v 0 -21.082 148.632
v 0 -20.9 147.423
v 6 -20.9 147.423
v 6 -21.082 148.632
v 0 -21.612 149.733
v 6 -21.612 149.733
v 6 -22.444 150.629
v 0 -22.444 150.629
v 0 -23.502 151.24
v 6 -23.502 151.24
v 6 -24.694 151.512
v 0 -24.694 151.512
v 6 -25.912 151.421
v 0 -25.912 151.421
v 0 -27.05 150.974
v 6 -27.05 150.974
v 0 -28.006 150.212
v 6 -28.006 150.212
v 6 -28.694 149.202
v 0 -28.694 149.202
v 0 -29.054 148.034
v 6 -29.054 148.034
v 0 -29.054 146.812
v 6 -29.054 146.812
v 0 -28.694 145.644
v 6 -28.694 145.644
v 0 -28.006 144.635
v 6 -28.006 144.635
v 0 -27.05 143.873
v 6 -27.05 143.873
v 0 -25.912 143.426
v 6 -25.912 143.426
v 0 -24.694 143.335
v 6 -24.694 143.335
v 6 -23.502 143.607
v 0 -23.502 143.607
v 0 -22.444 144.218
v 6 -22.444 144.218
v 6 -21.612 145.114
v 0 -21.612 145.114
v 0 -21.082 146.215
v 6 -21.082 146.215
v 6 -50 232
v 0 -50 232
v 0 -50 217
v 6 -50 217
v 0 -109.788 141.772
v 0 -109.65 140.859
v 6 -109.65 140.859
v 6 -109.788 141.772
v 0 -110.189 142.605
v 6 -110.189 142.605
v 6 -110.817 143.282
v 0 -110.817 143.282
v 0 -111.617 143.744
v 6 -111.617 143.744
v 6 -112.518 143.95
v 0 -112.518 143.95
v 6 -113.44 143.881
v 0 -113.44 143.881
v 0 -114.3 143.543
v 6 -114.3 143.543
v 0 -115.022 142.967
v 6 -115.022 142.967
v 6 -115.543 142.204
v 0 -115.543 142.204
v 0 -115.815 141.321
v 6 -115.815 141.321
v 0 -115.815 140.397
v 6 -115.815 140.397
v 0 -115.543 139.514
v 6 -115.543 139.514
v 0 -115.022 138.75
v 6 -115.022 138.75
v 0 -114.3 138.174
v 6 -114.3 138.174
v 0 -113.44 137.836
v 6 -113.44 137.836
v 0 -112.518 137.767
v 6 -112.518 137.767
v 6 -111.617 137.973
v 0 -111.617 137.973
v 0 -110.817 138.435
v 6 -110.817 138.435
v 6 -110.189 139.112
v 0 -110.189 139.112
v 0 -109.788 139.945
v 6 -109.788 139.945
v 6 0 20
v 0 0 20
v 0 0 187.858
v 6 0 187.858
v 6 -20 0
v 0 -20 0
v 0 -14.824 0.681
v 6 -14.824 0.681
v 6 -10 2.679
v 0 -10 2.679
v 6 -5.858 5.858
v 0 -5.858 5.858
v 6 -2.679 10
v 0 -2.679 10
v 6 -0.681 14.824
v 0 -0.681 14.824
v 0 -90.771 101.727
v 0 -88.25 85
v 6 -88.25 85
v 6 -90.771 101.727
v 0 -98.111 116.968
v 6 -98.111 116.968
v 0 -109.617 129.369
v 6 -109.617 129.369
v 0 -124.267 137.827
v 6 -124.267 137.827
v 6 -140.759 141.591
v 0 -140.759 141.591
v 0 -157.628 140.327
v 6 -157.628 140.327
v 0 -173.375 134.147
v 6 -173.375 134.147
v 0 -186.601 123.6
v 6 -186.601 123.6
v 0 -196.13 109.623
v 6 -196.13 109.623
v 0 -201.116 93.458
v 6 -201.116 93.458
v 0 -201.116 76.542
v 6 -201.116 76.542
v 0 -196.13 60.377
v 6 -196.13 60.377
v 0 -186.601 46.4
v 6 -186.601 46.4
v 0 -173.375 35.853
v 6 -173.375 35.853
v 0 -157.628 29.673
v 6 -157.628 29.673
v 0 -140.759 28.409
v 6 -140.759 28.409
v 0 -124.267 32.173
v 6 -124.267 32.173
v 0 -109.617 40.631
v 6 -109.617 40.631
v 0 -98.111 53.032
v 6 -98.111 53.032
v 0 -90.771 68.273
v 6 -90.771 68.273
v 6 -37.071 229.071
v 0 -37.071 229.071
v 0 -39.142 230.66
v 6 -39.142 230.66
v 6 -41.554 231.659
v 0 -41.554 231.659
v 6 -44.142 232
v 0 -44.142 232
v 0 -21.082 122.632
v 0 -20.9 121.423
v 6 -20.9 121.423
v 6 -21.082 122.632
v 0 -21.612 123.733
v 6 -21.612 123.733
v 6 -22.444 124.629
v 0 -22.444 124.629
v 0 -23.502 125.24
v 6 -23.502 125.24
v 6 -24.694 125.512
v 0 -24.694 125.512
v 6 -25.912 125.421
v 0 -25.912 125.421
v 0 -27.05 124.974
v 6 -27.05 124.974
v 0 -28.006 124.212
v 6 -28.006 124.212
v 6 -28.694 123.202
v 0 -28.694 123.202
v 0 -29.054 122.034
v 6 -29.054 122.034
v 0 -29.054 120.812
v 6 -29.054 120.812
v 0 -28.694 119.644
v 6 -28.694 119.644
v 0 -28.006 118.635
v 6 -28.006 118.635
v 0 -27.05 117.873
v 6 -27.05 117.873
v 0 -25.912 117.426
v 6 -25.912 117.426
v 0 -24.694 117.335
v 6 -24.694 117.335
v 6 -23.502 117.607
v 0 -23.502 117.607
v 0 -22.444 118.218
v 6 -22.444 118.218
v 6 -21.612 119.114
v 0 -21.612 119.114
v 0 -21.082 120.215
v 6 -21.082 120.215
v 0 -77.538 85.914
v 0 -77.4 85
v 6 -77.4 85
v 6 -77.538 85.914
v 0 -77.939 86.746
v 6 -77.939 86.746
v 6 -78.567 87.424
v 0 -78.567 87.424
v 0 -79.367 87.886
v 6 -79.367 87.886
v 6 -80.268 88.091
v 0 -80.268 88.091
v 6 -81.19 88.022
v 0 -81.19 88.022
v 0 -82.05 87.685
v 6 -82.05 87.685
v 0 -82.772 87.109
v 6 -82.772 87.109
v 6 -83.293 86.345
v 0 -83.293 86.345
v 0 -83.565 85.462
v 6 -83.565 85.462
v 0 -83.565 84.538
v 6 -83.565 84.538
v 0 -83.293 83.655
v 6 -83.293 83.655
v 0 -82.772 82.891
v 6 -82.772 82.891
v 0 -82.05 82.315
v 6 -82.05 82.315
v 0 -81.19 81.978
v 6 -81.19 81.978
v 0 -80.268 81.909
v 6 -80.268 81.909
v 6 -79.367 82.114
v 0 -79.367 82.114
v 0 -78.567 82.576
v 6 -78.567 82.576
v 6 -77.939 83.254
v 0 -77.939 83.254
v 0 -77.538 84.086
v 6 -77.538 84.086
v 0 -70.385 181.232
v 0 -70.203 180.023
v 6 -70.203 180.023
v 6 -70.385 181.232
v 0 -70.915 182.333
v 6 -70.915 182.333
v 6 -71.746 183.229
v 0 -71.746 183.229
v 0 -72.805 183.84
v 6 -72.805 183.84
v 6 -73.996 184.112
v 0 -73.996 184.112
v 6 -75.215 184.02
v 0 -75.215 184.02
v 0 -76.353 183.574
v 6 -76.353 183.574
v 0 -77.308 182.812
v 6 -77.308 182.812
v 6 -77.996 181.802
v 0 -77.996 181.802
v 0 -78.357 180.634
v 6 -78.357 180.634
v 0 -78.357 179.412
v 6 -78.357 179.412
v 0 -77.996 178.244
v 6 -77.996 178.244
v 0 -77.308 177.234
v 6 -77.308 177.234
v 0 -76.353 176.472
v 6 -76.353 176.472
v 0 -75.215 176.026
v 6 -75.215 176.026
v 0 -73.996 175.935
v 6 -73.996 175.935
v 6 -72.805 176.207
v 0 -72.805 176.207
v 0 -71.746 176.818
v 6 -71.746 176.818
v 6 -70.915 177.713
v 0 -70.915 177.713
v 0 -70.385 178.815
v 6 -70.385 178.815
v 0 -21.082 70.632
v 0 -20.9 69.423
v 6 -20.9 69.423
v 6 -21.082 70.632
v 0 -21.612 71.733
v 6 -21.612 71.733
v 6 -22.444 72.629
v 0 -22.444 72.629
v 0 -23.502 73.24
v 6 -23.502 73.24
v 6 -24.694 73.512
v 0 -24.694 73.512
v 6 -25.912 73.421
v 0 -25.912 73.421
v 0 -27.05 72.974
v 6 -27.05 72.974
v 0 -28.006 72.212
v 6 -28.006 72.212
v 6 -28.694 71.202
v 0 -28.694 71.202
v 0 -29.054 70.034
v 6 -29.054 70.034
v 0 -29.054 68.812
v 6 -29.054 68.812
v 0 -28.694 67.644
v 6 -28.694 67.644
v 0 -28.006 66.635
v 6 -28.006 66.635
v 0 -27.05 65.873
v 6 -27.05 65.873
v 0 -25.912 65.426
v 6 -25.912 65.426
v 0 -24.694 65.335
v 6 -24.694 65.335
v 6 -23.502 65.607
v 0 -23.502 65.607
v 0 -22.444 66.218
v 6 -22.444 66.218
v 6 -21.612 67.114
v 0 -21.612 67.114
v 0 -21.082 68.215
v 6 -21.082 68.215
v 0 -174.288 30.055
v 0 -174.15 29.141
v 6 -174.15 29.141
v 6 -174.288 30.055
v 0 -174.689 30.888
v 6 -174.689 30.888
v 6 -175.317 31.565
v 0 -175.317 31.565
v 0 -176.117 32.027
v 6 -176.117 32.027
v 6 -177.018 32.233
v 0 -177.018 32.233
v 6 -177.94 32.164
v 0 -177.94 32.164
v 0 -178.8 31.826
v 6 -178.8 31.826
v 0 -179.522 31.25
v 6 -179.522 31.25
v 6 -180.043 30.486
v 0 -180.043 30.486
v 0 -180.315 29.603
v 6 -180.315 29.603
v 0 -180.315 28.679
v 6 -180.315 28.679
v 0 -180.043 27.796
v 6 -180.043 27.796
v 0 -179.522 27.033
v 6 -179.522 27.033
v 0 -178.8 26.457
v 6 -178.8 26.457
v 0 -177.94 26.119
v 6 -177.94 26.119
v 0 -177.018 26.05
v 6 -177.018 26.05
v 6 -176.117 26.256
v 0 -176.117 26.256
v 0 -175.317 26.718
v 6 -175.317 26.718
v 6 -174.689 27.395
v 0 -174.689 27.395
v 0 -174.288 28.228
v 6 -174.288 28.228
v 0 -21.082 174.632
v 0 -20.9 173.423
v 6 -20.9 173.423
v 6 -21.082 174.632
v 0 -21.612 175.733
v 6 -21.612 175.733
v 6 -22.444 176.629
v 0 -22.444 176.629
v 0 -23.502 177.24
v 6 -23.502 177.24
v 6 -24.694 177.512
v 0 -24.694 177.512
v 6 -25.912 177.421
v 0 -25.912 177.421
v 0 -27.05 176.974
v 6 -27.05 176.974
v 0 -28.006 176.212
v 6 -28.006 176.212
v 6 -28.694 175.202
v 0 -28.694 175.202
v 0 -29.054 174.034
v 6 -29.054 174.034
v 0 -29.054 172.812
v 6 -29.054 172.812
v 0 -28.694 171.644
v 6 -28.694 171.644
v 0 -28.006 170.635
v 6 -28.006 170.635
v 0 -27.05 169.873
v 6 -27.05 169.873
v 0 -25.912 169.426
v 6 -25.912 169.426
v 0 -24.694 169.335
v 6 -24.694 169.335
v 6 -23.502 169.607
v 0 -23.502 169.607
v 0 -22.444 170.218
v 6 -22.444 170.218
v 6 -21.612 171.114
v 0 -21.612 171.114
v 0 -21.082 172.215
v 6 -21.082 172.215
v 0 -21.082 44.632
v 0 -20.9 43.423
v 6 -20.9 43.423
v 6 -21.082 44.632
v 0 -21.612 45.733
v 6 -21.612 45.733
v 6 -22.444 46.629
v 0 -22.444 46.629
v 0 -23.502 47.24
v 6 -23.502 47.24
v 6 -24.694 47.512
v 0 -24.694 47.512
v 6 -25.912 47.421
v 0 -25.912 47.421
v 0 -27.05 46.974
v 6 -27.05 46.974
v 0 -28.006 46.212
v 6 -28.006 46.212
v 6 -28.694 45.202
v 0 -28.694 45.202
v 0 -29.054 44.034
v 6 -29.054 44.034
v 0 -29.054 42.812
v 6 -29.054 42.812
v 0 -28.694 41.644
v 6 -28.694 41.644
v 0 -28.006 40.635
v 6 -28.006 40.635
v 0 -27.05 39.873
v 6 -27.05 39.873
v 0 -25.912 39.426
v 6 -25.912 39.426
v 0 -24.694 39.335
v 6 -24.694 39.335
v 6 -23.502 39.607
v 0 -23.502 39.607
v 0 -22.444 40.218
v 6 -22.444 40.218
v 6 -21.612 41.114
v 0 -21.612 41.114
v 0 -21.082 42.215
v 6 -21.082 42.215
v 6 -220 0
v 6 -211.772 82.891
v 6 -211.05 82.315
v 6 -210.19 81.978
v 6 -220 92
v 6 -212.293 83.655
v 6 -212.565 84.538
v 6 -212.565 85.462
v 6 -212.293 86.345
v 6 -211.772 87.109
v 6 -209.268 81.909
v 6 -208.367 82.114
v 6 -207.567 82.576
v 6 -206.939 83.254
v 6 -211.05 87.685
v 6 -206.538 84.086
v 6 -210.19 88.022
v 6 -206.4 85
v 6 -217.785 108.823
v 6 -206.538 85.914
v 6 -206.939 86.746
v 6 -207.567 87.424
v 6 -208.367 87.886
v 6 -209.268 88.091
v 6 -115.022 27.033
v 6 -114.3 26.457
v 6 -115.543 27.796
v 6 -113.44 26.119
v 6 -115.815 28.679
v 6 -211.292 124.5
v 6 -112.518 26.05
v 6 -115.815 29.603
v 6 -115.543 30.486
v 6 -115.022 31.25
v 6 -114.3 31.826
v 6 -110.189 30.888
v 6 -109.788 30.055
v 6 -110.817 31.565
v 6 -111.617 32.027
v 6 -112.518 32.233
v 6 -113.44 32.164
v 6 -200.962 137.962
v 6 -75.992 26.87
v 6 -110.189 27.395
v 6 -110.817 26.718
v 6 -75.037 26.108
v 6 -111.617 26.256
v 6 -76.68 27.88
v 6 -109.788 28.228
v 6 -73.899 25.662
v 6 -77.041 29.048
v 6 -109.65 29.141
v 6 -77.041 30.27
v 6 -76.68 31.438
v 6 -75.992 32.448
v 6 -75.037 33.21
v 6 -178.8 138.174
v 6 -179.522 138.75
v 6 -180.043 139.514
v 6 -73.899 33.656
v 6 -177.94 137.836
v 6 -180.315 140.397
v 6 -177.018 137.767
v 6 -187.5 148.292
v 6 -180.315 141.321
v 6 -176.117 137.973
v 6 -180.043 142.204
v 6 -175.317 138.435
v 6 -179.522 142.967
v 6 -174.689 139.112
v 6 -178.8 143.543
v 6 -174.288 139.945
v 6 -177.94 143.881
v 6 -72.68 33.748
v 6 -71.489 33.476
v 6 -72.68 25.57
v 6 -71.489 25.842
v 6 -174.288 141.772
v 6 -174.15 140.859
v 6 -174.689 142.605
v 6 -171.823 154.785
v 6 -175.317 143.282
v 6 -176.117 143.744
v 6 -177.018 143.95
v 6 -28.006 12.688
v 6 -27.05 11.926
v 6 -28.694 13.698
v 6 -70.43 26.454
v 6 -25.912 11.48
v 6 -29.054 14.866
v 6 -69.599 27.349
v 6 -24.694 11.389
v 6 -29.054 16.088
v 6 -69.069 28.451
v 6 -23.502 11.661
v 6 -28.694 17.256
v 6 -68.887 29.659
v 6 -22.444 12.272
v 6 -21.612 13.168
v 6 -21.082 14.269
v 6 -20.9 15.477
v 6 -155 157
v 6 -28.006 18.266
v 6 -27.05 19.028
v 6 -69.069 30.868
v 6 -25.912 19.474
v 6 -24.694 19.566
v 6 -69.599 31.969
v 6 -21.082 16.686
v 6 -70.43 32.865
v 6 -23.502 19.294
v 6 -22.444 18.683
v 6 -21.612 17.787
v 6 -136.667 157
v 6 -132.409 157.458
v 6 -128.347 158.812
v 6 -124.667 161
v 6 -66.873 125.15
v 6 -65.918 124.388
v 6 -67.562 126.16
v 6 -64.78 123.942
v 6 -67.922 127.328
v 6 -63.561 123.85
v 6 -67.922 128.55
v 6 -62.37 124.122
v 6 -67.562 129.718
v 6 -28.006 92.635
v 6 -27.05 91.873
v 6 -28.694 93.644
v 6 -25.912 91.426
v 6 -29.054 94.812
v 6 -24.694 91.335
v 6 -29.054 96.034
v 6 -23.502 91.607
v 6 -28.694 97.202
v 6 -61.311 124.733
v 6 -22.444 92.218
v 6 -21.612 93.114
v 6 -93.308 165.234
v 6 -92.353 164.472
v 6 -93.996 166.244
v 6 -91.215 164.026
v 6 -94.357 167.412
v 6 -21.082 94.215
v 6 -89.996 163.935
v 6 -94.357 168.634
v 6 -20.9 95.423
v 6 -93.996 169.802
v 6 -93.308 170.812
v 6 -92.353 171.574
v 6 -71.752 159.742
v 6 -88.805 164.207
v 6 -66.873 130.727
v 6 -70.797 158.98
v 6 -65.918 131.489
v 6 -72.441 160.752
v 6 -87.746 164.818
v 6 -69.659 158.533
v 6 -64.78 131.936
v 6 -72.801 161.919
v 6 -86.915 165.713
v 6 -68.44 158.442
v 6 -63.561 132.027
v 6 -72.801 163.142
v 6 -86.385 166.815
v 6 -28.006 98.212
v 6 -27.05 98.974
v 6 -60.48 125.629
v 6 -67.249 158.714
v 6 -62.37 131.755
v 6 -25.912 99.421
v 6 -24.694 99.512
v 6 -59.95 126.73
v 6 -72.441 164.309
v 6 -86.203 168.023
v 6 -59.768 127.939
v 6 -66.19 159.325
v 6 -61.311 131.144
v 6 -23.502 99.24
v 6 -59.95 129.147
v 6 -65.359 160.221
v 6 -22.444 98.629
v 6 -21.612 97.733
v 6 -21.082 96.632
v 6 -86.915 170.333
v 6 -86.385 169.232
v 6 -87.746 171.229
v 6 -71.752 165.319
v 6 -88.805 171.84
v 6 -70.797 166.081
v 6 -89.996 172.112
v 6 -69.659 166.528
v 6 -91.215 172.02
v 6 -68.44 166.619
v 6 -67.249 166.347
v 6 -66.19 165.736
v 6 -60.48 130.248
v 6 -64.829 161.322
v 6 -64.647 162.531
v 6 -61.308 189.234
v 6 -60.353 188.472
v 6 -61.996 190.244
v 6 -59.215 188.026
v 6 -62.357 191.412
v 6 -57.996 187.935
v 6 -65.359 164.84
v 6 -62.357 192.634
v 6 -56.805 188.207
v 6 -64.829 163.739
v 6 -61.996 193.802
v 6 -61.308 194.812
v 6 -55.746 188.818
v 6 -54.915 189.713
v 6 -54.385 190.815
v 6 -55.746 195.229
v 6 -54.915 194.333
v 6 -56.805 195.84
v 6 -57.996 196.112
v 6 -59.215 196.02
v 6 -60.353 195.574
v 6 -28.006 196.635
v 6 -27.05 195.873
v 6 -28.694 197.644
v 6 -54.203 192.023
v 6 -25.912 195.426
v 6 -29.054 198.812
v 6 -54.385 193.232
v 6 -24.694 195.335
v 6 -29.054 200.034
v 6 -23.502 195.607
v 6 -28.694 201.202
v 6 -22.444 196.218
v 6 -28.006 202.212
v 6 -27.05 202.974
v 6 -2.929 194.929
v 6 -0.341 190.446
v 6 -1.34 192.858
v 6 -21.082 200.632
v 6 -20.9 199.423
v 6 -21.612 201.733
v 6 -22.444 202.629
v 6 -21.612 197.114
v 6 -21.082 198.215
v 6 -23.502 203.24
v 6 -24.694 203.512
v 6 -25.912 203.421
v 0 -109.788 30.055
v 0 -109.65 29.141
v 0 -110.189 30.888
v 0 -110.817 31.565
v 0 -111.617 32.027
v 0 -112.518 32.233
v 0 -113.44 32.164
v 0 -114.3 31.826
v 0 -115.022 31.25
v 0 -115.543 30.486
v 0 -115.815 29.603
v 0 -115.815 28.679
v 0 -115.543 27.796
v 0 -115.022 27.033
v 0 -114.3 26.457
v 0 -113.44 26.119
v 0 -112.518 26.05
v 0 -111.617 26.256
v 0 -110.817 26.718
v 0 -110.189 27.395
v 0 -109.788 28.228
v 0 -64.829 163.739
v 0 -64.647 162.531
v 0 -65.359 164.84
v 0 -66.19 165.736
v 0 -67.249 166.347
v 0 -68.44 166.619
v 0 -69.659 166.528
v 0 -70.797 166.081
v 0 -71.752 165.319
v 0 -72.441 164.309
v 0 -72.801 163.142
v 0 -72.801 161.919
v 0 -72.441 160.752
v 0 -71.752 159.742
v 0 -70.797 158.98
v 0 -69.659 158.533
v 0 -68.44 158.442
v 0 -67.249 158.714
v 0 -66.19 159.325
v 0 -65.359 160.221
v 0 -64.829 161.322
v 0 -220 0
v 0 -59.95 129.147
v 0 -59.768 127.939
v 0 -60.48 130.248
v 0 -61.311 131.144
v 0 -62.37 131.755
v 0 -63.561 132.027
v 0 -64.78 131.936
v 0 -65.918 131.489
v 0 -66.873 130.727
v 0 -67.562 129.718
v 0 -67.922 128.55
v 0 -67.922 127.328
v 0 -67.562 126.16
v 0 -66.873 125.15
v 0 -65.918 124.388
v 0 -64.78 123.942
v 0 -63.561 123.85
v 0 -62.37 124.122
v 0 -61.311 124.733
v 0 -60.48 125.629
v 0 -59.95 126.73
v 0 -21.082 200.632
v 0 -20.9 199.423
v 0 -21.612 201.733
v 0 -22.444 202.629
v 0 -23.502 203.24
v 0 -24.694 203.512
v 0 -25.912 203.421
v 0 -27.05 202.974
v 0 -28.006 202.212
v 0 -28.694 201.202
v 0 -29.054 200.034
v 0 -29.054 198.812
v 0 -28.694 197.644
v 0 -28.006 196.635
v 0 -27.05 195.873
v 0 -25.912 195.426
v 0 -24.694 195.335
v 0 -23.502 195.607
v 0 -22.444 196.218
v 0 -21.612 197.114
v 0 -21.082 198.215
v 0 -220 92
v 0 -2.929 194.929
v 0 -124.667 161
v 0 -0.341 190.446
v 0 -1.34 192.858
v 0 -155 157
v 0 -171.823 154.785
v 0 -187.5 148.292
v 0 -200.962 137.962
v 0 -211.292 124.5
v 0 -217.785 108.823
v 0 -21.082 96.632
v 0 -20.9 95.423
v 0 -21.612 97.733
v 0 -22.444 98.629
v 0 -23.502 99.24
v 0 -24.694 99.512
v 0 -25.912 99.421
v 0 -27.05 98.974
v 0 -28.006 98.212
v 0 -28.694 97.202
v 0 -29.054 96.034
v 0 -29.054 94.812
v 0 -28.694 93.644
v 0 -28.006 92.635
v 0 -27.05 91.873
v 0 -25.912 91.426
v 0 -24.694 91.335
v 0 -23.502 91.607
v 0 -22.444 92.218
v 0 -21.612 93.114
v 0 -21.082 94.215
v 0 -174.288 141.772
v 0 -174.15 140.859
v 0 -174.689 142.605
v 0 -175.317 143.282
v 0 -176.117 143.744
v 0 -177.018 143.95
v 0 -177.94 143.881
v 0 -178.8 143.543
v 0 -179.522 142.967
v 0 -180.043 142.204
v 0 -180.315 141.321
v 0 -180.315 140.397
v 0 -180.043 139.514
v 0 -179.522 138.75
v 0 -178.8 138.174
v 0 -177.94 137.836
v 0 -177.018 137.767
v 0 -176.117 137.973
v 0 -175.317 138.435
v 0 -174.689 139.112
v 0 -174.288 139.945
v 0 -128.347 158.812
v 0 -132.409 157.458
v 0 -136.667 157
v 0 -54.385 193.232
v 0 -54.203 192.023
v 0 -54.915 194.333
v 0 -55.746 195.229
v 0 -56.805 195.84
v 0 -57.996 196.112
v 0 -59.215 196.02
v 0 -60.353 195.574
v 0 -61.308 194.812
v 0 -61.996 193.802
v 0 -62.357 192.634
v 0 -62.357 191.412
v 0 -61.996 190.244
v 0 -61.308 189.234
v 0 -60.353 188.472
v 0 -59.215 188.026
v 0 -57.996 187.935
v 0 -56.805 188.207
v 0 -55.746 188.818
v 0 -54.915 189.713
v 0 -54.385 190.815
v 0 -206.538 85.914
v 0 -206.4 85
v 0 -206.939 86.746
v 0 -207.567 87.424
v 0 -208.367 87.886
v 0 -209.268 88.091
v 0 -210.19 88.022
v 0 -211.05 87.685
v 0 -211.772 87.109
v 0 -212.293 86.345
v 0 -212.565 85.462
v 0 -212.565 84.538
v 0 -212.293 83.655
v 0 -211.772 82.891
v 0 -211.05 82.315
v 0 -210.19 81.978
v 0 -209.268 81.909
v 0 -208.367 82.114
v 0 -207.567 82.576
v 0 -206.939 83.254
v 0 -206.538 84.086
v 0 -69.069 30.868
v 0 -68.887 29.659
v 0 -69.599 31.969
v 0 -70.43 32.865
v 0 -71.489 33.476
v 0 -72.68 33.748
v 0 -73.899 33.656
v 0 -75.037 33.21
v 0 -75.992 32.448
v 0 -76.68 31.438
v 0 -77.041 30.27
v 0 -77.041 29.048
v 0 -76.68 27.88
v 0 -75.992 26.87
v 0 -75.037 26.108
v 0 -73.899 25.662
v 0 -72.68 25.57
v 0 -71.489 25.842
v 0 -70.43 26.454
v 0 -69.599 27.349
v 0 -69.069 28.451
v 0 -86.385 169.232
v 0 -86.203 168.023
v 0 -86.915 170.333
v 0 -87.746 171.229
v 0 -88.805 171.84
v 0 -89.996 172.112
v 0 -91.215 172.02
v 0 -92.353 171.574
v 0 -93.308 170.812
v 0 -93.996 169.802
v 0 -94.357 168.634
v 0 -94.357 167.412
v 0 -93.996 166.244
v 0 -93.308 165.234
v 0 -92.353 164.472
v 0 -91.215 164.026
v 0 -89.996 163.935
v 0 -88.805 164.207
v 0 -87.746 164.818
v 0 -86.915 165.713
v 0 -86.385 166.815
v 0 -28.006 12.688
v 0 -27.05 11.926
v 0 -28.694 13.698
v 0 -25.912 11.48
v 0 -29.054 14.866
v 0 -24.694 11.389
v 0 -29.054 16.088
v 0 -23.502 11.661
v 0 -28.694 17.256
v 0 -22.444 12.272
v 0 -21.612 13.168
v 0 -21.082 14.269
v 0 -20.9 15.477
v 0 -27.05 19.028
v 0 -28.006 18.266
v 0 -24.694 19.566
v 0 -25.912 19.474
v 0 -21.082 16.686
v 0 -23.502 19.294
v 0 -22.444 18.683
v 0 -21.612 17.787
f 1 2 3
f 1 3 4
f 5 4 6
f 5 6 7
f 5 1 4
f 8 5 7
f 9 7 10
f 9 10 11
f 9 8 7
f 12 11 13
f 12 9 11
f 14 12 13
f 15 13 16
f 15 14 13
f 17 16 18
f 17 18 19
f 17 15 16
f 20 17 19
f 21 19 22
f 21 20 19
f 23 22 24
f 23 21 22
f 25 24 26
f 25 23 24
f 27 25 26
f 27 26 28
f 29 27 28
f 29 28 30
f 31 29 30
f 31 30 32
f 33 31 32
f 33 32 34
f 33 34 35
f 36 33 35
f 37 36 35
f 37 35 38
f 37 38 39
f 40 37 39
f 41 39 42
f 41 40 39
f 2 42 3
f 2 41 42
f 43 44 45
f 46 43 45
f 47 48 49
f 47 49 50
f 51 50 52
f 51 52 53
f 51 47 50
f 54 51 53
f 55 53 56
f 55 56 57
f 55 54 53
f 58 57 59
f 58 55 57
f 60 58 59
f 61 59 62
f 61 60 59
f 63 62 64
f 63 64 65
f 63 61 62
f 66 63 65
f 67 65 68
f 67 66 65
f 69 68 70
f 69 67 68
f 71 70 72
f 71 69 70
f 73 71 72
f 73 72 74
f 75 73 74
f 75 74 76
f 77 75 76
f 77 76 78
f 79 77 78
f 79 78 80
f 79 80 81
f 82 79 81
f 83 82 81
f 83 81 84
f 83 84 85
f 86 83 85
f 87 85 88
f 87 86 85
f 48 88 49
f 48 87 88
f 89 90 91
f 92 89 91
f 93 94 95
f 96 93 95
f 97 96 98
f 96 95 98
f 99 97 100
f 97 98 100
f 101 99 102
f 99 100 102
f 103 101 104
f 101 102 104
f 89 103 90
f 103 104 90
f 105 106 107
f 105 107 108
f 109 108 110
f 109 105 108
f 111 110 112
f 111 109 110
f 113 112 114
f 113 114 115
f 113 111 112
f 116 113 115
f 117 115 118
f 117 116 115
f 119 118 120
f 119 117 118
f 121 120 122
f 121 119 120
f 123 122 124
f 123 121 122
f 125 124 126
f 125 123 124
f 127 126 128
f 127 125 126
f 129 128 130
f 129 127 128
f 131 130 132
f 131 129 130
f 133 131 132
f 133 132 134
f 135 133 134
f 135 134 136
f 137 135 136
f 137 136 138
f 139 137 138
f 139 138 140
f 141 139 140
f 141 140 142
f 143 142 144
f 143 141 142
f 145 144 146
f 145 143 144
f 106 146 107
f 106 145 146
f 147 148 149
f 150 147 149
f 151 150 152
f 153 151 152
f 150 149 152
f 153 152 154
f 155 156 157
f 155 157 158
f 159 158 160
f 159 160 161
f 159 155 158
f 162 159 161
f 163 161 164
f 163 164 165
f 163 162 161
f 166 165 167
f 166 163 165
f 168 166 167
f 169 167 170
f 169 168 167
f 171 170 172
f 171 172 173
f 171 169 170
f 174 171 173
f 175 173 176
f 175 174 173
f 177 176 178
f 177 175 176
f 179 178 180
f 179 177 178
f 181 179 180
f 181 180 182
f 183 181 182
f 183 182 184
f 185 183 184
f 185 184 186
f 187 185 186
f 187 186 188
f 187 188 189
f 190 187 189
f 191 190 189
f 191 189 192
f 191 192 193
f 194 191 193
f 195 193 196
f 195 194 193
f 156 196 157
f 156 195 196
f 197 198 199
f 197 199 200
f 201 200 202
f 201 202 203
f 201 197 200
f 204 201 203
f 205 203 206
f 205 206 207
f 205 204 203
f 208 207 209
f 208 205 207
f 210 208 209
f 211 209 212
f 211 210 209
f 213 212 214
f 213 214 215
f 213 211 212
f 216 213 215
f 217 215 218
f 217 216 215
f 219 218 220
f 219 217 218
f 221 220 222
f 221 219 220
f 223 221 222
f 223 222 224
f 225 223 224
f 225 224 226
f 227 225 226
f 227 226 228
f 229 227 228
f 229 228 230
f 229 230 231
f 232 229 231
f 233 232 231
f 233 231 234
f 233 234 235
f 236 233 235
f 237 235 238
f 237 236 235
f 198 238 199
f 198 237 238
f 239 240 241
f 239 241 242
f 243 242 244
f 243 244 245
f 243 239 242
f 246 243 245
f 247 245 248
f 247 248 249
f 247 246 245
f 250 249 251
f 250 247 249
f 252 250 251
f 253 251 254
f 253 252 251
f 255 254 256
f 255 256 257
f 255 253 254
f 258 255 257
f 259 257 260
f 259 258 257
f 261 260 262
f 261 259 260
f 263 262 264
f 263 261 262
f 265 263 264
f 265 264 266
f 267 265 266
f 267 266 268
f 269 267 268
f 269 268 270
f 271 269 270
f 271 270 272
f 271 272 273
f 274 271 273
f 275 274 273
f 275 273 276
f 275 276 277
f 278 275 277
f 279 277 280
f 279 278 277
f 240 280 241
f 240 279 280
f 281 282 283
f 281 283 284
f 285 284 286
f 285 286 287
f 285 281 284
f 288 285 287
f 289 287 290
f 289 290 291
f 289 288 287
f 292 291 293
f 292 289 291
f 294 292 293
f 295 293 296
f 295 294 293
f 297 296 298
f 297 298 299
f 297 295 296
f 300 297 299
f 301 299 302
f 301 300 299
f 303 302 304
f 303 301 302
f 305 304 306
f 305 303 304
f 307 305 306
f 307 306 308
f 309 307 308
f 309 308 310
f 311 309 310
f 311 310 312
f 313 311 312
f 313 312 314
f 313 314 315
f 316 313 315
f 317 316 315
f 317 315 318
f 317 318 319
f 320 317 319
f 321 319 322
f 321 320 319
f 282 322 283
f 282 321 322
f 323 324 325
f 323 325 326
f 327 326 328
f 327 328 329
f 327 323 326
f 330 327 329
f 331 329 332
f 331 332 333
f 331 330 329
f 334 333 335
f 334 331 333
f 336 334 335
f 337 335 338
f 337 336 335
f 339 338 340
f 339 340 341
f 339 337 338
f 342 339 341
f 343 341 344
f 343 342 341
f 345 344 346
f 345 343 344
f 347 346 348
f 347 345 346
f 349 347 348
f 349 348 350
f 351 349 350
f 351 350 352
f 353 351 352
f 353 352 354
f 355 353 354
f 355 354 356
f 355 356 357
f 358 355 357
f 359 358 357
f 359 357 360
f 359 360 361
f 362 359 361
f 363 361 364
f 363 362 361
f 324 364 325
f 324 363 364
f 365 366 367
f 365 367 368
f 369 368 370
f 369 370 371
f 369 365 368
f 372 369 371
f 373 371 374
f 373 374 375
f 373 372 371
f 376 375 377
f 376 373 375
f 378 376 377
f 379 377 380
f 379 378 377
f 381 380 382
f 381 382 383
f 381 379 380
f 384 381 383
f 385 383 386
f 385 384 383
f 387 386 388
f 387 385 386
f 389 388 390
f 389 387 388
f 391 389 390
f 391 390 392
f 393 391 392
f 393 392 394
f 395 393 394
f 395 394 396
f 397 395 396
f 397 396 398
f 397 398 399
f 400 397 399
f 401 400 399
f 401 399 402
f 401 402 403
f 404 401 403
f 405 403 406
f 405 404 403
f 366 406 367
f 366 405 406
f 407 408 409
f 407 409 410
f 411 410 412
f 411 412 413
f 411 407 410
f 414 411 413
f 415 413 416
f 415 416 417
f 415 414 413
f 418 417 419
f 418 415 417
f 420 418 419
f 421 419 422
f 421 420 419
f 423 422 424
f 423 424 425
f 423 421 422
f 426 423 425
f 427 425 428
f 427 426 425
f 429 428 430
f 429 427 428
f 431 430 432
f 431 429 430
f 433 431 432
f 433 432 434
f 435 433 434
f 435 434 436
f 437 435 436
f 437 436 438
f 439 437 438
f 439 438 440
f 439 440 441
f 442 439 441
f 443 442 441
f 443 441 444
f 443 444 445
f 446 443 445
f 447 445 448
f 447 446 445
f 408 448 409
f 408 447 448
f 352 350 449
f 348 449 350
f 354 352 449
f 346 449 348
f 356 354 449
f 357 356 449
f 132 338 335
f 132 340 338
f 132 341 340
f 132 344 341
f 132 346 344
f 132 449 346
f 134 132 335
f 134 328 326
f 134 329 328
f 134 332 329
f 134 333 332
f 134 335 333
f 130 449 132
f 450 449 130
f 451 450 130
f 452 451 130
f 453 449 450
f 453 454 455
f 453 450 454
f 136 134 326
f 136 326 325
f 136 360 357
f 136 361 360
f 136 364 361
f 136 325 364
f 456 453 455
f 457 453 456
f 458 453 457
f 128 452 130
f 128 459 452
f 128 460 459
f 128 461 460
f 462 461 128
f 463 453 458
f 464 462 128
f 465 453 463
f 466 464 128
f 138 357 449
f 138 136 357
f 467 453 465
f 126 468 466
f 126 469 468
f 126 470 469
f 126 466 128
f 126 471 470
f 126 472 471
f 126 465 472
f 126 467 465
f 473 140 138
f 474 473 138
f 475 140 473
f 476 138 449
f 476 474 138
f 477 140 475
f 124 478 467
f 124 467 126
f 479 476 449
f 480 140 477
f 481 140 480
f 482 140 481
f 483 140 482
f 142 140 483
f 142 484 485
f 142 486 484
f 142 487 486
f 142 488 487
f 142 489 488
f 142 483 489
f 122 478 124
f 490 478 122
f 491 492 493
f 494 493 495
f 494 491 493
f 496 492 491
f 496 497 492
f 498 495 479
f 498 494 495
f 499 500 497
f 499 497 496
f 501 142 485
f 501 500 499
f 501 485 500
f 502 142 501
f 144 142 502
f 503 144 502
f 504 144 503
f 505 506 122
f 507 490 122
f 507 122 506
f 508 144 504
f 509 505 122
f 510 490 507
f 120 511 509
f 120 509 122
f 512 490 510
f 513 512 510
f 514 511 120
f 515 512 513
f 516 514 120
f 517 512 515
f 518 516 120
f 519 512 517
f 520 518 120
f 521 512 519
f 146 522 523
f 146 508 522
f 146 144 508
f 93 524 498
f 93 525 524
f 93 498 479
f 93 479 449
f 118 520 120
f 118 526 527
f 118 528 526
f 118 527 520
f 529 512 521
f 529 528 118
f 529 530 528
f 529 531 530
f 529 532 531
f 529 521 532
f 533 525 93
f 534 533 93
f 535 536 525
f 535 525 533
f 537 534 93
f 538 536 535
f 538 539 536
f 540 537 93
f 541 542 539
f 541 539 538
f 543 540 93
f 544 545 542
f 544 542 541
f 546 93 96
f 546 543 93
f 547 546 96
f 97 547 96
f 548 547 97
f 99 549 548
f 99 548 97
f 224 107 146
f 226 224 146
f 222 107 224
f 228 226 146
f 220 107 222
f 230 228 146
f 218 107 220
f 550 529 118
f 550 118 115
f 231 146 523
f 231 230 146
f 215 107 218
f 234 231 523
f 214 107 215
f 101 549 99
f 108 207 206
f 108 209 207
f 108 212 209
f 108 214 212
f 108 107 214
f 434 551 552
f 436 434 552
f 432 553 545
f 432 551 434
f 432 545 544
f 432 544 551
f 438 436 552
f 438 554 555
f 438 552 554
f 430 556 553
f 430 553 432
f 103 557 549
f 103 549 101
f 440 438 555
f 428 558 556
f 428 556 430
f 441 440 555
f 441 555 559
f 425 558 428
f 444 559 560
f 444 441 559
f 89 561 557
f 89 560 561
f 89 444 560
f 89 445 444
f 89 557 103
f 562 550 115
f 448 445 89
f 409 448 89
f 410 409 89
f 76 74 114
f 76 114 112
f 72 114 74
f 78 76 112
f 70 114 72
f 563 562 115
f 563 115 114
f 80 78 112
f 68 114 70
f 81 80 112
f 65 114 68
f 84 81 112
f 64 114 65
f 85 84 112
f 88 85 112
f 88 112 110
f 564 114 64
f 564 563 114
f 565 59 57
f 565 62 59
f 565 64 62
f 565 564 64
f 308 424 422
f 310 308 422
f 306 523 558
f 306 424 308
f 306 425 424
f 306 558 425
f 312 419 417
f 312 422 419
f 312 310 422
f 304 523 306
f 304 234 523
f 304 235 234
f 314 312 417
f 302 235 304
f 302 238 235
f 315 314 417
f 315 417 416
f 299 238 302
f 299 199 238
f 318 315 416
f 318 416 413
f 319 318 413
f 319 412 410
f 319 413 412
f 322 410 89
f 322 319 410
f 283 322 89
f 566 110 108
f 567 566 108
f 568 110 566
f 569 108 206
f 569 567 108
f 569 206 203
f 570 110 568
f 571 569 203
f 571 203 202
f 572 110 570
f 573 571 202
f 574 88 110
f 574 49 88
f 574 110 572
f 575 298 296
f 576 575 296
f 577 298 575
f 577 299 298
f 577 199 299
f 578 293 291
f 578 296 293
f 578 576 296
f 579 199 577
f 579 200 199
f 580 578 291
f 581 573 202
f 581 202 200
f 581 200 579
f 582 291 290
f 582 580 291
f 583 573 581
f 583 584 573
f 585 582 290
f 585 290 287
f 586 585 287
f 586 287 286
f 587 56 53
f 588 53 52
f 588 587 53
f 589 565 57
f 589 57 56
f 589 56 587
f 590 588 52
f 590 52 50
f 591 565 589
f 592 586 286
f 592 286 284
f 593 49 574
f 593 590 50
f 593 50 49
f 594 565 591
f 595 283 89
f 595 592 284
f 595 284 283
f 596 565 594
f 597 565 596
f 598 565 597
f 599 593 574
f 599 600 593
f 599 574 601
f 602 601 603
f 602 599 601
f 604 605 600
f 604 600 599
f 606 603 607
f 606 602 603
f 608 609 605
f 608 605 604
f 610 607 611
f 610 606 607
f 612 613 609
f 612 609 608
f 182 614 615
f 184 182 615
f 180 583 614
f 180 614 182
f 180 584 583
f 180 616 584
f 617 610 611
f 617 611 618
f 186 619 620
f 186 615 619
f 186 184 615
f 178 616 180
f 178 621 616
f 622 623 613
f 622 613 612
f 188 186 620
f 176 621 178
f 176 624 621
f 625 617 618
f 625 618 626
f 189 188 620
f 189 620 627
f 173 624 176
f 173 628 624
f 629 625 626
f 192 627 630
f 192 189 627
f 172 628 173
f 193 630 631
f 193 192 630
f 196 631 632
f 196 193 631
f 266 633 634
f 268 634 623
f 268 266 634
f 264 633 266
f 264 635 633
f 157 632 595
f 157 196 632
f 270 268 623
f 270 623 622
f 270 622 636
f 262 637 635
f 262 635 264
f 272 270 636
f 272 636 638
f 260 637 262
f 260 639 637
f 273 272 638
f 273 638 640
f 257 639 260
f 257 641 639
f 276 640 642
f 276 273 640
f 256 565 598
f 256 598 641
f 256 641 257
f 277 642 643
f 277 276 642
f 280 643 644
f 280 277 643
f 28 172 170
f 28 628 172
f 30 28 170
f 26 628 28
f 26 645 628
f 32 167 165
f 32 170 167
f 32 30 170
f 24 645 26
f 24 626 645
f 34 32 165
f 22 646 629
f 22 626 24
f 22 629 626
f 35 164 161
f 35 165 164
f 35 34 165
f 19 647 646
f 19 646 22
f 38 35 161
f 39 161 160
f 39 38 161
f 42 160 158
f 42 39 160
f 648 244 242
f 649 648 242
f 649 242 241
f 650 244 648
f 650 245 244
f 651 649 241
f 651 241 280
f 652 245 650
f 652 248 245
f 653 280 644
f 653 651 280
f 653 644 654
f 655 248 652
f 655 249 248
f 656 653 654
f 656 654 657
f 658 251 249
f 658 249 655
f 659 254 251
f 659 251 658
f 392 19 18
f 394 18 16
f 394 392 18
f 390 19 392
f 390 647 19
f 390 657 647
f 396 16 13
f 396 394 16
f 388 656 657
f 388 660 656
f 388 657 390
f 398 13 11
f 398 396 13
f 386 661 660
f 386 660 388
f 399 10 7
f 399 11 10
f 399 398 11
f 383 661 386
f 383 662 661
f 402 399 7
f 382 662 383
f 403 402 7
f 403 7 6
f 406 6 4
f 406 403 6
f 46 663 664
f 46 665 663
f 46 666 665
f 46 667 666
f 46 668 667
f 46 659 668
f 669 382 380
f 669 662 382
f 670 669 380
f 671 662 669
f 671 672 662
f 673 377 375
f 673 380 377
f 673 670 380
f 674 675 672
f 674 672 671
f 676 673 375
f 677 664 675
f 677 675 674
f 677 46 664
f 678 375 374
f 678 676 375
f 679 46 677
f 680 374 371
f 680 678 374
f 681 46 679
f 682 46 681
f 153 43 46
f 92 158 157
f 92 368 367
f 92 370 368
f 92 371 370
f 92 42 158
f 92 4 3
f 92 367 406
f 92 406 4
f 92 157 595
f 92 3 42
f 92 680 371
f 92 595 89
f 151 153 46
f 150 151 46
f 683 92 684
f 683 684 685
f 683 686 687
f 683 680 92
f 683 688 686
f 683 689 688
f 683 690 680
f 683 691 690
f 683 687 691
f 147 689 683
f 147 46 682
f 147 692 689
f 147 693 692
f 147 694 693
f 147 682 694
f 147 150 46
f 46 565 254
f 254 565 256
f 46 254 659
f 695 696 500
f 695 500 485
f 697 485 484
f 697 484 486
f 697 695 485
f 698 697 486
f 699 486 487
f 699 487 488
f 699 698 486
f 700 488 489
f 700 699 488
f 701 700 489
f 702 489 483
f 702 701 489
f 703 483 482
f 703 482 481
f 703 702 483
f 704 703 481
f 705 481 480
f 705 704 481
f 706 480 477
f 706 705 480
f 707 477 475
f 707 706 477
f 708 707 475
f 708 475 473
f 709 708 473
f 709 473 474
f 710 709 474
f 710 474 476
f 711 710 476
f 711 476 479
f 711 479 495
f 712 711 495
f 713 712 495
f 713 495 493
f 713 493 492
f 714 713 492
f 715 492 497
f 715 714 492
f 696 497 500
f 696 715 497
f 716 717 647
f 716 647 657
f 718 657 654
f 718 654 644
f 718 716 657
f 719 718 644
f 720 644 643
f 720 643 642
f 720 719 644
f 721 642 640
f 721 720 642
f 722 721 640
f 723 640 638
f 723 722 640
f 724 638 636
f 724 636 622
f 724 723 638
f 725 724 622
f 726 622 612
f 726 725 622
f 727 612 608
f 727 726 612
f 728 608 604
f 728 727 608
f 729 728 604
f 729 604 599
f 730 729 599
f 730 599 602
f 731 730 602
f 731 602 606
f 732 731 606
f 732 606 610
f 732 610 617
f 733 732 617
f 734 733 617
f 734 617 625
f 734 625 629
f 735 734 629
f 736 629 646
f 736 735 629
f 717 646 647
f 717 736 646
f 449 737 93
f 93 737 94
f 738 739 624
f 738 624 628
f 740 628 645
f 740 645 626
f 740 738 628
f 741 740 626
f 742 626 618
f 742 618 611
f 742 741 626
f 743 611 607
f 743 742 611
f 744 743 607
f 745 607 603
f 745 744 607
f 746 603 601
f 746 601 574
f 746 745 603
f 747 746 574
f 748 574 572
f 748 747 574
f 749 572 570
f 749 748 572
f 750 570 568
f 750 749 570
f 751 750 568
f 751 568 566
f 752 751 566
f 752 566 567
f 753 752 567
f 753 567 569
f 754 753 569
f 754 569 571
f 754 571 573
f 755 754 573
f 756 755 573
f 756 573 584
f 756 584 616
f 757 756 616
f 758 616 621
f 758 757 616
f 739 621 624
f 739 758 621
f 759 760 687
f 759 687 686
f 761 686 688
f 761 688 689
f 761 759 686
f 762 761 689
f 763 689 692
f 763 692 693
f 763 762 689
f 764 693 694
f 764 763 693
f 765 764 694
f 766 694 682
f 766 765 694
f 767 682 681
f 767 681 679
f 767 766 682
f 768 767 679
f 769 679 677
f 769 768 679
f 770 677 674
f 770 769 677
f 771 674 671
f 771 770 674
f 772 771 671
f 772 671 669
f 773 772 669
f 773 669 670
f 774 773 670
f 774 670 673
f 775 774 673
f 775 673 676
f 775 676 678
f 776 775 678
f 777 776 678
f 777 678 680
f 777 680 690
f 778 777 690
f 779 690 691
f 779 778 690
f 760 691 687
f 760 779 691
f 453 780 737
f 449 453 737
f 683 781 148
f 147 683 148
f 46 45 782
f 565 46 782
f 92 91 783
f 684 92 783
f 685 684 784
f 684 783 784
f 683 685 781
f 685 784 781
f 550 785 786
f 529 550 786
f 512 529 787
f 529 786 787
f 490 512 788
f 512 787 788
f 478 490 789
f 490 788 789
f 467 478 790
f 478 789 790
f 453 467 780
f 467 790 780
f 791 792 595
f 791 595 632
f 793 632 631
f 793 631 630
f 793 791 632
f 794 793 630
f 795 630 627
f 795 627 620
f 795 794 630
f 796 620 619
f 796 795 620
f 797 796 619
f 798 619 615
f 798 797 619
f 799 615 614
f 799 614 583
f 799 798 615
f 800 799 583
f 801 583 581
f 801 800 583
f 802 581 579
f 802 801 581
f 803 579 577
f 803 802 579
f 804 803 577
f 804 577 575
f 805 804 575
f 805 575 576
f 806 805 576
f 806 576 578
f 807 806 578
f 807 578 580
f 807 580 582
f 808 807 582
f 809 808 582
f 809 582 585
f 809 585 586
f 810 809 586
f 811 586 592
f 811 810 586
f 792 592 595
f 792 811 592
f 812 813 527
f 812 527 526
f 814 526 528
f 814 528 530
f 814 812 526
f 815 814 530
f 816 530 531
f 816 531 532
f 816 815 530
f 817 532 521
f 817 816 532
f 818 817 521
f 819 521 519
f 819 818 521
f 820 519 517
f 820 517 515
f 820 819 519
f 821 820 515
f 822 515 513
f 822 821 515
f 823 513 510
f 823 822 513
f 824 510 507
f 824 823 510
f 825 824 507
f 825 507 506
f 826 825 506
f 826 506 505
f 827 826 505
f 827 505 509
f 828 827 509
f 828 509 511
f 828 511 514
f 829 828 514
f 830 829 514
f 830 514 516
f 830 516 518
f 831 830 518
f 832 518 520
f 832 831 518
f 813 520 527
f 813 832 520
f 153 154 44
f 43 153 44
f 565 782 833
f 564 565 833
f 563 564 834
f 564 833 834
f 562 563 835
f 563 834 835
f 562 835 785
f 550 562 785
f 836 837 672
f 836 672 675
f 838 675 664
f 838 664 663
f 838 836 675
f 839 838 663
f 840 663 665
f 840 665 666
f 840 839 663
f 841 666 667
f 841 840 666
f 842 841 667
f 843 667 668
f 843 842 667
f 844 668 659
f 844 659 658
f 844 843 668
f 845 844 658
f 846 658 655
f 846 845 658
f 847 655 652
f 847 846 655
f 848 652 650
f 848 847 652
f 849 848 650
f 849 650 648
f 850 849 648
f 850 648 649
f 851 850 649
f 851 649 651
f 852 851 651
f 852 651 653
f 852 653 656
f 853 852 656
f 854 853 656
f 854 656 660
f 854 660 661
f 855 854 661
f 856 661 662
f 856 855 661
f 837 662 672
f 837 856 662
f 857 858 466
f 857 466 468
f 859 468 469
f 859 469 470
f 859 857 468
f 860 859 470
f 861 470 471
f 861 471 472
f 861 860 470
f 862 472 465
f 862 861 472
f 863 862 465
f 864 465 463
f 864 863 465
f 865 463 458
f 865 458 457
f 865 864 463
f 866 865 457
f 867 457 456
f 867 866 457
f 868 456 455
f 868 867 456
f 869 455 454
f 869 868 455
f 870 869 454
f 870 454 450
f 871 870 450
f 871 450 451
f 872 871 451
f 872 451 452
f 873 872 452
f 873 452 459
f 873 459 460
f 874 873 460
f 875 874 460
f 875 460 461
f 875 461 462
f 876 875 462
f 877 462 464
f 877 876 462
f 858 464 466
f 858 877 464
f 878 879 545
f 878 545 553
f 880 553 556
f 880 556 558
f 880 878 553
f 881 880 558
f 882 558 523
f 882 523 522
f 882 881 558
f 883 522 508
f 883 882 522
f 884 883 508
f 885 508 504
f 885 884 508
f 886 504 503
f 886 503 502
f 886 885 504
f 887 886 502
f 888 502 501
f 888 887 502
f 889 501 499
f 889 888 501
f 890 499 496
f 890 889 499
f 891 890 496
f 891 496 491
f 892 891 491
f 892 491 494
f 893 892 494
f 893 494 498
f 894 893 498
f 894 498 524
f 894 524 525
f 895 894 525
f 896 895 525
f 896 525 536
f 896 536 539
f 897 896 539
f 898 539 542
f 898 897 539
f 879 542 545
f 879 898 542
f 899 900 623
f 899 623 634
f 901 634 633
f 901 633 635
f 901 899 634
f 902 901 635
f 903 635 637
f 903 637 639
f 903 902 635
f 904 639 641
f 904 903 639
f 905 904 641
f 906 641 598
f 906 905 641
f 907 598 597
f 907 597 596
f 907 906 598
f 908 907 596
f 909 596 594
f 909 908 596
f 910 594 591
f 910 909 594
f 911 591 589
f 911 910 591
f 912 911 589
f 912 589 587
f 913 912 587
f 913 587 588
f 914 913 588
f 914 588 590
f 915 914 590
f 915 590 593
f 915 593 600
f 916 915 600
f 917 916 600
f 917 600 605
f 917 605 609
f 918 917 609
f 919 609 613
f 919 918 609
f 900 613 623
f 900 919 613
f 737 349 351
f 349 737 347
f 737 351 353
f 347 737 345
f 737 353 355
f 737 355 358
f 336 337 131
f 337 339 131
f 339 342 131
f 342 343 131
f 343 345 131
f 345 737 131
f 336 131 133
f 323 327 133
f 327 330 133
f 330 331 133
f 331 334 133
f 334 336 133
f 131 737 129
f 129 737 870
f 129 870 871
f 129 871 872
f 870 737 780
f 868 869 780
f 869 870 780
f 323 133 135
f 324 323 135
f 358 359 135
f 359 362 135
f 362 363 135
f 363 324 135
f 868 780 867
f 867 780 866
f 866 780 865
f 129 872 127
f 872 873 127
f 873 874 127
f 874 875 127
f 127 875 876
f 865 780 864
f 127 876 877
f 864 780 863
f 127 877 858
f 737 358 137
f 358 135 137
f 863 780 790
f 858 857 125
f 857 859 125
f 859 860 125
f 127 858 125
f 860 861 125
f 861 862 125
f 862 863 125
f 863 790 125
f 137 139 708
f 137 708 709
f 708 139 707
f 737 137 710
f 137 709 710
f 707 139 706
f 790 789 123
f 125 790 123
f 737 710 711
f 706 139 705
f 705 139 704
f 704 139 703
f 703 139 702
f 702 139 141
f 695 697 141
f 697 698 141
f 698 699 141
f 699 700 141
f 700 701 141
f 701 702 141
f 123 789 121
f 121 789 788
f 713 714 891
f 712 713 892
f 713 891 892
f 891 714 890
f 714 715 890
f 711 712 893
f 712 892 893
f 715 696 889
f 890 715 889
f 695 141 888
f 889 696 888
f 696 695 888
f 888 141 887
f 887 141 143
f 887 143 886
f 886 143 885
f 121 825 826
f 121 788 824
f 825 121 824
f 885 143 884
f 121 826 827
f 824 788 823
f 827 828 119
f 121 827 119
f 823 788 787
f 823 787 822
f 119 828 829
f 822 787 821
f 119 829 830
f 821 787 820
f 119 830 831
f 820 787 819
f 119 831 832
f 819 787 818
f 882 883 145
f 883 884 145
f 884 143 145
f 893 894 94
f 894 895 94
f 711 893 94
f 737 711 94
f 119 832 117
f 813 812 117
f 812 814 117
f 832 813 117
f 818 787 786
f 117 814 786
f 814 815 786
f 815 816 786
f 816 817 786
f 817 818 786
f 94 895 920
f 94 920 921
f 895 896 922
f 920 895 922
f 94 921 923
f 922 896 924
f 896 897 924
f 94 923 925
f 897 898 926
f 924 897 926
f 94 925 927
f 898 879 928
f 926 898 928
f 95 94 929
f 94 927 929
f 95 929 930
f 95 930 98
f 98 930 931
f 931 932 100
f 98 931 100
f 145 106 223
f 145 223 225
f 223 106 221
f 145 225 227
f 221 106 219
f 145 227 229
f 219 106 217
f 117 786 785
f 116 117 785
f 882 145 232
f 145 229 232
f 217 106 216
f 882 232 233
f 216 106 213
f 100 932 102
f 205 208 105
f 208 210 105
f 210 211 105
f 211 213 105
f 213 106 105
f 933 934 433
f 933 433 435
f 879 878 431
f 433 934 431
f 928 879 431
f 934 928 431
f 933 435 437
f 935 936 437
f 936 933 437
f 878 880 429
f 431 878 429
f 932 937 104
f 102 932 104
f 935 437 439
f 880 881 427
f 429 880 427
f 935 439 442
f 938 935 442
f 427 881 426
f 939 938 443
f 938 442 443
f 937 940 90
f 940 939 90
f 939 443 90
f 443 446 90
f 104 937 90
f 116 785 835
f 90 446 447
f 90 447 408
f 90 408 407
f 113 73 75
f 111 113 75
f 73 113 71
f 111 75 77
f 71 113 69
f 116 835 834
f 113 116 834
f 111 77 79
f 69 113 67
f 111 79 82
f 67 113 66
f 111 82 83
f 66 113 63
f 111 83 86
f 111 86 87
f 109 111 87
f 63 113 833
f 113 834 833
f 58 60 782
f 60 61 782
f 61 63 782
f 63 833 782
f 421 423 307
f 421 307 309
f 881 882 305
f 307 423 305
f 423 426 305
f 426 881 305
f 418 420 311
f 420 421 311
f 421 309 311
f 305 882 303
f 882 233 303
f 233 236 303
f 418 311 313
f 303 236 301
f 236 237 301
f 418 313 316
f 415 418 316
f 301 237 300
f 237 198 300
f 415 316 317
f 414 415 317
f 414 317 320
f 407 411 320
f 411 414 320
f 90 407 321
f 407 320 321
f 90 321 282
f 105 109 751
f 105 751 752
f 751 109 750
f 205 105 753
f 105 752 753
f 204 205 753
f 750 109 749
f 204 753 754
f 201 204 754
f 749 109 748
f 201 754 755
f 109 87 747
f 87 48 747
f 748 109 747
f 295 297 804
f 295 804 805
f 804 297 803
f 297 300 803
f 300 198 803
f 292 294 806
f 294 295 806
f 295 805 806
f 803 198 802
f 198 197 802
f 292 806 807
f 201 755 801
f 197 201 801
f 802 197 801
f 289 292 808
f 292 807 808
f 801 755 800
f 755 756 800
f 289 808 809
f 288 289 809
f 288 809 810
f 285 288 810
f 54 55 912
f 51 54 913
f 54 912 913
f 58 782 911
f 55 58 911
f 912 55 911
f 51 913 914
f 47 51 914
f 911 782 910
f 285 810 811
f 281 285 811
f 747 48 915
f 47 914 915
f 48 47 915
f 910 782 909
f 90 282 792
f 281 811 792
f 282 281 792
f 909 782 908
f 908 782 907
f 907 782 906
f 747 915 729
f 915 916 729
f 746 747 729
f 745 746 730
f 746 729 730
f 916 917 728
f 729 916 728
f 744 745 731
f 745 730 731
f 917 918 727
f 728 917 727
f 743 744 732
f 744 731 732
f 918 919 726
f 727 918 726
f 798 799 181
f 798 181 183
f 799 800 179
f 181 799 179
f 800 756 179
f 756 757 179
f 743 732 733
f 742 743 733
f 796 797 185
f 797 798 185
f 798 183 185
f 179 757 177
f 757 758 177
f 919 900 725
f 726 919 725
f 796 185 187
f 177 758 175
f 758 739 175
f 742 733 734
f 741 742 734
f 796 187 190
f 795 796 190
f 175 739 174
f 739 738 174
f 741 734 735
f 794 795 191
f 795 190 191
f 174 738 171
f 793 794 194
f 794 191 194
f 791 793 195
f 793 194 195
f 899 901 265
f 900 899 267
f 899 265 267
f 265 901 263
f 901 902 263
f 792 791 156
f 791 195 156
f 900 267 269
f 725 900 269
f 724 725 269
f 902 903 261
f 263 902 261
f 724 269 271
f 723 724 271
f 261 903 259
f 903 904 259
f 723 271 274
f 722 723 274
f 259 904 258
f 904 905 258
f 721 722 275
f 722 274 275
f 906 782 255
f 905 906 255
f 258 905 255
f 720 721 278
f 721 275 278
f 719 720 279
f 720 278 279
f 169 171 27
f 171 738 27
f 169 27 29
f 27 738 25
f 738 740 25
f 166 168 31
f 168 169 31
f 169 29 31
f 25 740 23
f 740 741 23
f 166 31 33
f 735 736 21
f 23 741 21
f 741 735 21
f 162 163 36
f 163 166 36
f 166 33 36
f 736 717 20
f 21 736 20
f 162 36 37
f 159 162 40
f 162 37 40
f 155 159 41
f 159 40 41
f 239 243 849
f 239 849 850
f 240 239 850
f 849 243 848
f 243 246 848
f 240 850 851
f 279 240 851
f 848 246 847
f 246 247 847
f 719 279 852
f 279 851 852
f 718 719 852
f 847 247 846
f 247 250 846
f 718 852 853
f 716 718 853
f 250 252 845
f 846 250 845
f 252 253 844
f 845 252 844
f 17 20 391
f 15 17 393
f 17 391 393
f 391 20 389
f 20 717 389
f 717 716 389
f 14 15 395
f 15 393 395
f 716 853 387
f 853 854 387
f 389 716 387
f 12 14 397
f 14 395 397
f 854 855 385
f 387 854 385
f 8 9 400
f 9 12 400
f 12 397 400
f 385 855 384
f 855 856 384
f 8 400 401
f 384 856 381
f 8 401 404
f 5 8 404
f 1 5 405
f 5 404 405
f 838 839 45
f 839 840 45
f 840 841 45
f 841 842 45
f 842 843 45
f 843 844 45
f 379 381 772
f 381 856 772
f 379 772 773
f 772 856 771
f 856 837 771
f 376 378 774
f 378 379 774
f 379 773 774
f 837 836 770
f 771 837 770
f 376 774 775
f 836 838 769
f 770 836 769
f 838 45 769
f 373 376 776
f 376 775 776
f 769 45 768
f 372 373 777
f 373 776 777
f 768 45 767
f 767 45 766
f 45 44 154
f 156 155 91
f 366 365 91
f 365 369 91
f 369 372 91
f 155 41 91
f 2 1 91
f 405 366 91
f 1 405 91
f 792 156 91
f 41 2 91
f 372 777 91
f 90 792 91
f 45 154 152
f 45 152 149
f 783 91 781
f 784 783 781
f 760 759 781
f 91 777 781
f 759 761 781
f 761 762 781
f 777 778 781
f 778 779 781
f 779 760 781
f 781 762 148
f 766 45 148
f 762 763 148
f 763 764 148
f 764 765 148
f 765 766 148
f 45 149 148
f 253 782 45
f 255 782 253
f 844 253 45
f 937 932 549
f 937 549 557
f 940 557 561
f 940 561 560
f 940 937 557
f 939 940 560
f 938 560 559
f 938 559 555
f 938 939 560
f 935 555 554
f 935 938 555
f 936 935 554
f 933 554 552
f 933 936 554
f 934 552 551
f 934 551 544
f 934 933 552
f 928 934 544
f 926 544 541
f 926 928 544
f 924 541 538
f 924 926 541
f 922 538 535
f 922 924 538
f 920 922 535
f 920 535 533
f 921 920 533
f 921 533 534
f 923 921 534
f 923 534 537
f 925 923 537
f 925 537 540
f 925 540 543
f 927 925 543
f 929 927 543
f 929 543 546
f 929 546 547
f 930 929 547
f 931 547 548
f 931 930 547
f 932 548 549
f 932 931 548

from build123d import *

# Parameters (mm, degrees)
F0_R     = 3.1
F0_R_2   = 56.75
F0_R_3   = 4.1
F1_DEPTH = 6


with BuildPart() as f1:
    # F0 (on Right) → F1 (new body)
    with BuildSketch(Plane.YZ):
        with BuildLine():
            Line((-220, 0), (-20, 0))
            ThreePointArc((-20, 0), (-5.857864, 5.857864), (0, 20))
            Line((0, 20), (0, 187.857864))
            ThreePointArc((0, 187.857864), (-0.761205, 191.684699), (-2.928932, 194.928932))
            Line((-2.928932, 194.928932), (-37.071068, 229.071068))
            ThreePointArc((-37.071068, 229.071068), (-40.315301, 231.238795), (-44.142136, 232))
            Line((-44.142136, 232), (-50, 232))
            Line((-50, 232), (-50, 217))
            Line((-50, 217), (-124.666667, 161))
            ThreePointArc((-124.666667, 161), (-130.342111, 158.026334), (-136.666667, 157))
            Line((-136.666667, 157), (-155, 157))
            ThreePointArc((-155, 157), (-200.961941, 137.961941), (-220, 92))
            Line((-220, 92), (-220, 0))
        make_face()
        with Locations((-177.25, 29.141361)):
            Circle(F0_R, mode=Mode.SUBTRACT)
        with Locations((-112.75, 29.141361)):
            Circle(F0_R, mode=Mode.SUBTRACT)
        with Locations((-209.5, 85)):
            Circle(F0_R, mode=Mode.SUBTRACT)
        with Locations((-145, 85)):
            Circle(F0_R_2, mode=Mode.SUBTRACT)
        with Locations((-72.986513, 29.659025)):
            Circle(F0_R_3, mode=Mode.SUBTRACT)
        with Locations((-25, 15.477134)):
            Circle(F0_R_3, mode=Mode.SUBTRACT)
        with Locations((-25, 43.423373)):
            Circle(F0_R_3, mode=Mode.SUBTRACT)
        with Locations((-80.5, 85)):
            Circle(F0_R, mode=Mode.SUBTRACT)
        with Locations((-25, 69.423373)):
            Circle(F0_R_3, mode=Mode.SUBTRACT)
        with Locations((-25, 95.423373)):
            Circle(F0_R_3, mode=Mode.SUBTRACT)
        with Locations((-177.25, 140.858639)):
            Circle(F0_R, mode=Mode.SUBTRACT)
        with Locations((-112.75, 140.858639)):
            Circle(F0_R, mode=Mode.SUBTRACT)
        with Locations((-63.867599, 127.938718)):
            Circle(F0_R_3, mode=Mode.SUBTRACT)
        with Locations((-90.302517, 168.023112)):
            Circle(F0_R_3, mode=Mode.SUBTRACT)
        with Locations((-68.746537, 162.530556)):
            Circle(F0_R_3, mode=Mode.SUBTRACT)
        with Locations((-25, 121.423373)):
            Circle(F0_R_3, mode=Mode.SUBTRACT)
        with Locations((-25, 147.423373)):
            Circle(F0_R_3, mode=Mode.SUBTRACT)
        with Locations((-25, 173.423373)):
            Circle(F0_R_3, mode=Mode.SUBTRACT)
        with Locations((-74.302517, 180.023112)):
            Circle(F0_R_3, mode=Mode.SUBTRACT)
        with Locations((-58.302517, 192.023112)):
            Circle(F0_R_3, mode=Mode.SUBTRACT)
        with Locations((-25, 199.423373)):
            Circle(F0_R_3, mode=Mode.SUBTRACT)
    extrude(amount=F1_DEPTH)


solid = f1.part
